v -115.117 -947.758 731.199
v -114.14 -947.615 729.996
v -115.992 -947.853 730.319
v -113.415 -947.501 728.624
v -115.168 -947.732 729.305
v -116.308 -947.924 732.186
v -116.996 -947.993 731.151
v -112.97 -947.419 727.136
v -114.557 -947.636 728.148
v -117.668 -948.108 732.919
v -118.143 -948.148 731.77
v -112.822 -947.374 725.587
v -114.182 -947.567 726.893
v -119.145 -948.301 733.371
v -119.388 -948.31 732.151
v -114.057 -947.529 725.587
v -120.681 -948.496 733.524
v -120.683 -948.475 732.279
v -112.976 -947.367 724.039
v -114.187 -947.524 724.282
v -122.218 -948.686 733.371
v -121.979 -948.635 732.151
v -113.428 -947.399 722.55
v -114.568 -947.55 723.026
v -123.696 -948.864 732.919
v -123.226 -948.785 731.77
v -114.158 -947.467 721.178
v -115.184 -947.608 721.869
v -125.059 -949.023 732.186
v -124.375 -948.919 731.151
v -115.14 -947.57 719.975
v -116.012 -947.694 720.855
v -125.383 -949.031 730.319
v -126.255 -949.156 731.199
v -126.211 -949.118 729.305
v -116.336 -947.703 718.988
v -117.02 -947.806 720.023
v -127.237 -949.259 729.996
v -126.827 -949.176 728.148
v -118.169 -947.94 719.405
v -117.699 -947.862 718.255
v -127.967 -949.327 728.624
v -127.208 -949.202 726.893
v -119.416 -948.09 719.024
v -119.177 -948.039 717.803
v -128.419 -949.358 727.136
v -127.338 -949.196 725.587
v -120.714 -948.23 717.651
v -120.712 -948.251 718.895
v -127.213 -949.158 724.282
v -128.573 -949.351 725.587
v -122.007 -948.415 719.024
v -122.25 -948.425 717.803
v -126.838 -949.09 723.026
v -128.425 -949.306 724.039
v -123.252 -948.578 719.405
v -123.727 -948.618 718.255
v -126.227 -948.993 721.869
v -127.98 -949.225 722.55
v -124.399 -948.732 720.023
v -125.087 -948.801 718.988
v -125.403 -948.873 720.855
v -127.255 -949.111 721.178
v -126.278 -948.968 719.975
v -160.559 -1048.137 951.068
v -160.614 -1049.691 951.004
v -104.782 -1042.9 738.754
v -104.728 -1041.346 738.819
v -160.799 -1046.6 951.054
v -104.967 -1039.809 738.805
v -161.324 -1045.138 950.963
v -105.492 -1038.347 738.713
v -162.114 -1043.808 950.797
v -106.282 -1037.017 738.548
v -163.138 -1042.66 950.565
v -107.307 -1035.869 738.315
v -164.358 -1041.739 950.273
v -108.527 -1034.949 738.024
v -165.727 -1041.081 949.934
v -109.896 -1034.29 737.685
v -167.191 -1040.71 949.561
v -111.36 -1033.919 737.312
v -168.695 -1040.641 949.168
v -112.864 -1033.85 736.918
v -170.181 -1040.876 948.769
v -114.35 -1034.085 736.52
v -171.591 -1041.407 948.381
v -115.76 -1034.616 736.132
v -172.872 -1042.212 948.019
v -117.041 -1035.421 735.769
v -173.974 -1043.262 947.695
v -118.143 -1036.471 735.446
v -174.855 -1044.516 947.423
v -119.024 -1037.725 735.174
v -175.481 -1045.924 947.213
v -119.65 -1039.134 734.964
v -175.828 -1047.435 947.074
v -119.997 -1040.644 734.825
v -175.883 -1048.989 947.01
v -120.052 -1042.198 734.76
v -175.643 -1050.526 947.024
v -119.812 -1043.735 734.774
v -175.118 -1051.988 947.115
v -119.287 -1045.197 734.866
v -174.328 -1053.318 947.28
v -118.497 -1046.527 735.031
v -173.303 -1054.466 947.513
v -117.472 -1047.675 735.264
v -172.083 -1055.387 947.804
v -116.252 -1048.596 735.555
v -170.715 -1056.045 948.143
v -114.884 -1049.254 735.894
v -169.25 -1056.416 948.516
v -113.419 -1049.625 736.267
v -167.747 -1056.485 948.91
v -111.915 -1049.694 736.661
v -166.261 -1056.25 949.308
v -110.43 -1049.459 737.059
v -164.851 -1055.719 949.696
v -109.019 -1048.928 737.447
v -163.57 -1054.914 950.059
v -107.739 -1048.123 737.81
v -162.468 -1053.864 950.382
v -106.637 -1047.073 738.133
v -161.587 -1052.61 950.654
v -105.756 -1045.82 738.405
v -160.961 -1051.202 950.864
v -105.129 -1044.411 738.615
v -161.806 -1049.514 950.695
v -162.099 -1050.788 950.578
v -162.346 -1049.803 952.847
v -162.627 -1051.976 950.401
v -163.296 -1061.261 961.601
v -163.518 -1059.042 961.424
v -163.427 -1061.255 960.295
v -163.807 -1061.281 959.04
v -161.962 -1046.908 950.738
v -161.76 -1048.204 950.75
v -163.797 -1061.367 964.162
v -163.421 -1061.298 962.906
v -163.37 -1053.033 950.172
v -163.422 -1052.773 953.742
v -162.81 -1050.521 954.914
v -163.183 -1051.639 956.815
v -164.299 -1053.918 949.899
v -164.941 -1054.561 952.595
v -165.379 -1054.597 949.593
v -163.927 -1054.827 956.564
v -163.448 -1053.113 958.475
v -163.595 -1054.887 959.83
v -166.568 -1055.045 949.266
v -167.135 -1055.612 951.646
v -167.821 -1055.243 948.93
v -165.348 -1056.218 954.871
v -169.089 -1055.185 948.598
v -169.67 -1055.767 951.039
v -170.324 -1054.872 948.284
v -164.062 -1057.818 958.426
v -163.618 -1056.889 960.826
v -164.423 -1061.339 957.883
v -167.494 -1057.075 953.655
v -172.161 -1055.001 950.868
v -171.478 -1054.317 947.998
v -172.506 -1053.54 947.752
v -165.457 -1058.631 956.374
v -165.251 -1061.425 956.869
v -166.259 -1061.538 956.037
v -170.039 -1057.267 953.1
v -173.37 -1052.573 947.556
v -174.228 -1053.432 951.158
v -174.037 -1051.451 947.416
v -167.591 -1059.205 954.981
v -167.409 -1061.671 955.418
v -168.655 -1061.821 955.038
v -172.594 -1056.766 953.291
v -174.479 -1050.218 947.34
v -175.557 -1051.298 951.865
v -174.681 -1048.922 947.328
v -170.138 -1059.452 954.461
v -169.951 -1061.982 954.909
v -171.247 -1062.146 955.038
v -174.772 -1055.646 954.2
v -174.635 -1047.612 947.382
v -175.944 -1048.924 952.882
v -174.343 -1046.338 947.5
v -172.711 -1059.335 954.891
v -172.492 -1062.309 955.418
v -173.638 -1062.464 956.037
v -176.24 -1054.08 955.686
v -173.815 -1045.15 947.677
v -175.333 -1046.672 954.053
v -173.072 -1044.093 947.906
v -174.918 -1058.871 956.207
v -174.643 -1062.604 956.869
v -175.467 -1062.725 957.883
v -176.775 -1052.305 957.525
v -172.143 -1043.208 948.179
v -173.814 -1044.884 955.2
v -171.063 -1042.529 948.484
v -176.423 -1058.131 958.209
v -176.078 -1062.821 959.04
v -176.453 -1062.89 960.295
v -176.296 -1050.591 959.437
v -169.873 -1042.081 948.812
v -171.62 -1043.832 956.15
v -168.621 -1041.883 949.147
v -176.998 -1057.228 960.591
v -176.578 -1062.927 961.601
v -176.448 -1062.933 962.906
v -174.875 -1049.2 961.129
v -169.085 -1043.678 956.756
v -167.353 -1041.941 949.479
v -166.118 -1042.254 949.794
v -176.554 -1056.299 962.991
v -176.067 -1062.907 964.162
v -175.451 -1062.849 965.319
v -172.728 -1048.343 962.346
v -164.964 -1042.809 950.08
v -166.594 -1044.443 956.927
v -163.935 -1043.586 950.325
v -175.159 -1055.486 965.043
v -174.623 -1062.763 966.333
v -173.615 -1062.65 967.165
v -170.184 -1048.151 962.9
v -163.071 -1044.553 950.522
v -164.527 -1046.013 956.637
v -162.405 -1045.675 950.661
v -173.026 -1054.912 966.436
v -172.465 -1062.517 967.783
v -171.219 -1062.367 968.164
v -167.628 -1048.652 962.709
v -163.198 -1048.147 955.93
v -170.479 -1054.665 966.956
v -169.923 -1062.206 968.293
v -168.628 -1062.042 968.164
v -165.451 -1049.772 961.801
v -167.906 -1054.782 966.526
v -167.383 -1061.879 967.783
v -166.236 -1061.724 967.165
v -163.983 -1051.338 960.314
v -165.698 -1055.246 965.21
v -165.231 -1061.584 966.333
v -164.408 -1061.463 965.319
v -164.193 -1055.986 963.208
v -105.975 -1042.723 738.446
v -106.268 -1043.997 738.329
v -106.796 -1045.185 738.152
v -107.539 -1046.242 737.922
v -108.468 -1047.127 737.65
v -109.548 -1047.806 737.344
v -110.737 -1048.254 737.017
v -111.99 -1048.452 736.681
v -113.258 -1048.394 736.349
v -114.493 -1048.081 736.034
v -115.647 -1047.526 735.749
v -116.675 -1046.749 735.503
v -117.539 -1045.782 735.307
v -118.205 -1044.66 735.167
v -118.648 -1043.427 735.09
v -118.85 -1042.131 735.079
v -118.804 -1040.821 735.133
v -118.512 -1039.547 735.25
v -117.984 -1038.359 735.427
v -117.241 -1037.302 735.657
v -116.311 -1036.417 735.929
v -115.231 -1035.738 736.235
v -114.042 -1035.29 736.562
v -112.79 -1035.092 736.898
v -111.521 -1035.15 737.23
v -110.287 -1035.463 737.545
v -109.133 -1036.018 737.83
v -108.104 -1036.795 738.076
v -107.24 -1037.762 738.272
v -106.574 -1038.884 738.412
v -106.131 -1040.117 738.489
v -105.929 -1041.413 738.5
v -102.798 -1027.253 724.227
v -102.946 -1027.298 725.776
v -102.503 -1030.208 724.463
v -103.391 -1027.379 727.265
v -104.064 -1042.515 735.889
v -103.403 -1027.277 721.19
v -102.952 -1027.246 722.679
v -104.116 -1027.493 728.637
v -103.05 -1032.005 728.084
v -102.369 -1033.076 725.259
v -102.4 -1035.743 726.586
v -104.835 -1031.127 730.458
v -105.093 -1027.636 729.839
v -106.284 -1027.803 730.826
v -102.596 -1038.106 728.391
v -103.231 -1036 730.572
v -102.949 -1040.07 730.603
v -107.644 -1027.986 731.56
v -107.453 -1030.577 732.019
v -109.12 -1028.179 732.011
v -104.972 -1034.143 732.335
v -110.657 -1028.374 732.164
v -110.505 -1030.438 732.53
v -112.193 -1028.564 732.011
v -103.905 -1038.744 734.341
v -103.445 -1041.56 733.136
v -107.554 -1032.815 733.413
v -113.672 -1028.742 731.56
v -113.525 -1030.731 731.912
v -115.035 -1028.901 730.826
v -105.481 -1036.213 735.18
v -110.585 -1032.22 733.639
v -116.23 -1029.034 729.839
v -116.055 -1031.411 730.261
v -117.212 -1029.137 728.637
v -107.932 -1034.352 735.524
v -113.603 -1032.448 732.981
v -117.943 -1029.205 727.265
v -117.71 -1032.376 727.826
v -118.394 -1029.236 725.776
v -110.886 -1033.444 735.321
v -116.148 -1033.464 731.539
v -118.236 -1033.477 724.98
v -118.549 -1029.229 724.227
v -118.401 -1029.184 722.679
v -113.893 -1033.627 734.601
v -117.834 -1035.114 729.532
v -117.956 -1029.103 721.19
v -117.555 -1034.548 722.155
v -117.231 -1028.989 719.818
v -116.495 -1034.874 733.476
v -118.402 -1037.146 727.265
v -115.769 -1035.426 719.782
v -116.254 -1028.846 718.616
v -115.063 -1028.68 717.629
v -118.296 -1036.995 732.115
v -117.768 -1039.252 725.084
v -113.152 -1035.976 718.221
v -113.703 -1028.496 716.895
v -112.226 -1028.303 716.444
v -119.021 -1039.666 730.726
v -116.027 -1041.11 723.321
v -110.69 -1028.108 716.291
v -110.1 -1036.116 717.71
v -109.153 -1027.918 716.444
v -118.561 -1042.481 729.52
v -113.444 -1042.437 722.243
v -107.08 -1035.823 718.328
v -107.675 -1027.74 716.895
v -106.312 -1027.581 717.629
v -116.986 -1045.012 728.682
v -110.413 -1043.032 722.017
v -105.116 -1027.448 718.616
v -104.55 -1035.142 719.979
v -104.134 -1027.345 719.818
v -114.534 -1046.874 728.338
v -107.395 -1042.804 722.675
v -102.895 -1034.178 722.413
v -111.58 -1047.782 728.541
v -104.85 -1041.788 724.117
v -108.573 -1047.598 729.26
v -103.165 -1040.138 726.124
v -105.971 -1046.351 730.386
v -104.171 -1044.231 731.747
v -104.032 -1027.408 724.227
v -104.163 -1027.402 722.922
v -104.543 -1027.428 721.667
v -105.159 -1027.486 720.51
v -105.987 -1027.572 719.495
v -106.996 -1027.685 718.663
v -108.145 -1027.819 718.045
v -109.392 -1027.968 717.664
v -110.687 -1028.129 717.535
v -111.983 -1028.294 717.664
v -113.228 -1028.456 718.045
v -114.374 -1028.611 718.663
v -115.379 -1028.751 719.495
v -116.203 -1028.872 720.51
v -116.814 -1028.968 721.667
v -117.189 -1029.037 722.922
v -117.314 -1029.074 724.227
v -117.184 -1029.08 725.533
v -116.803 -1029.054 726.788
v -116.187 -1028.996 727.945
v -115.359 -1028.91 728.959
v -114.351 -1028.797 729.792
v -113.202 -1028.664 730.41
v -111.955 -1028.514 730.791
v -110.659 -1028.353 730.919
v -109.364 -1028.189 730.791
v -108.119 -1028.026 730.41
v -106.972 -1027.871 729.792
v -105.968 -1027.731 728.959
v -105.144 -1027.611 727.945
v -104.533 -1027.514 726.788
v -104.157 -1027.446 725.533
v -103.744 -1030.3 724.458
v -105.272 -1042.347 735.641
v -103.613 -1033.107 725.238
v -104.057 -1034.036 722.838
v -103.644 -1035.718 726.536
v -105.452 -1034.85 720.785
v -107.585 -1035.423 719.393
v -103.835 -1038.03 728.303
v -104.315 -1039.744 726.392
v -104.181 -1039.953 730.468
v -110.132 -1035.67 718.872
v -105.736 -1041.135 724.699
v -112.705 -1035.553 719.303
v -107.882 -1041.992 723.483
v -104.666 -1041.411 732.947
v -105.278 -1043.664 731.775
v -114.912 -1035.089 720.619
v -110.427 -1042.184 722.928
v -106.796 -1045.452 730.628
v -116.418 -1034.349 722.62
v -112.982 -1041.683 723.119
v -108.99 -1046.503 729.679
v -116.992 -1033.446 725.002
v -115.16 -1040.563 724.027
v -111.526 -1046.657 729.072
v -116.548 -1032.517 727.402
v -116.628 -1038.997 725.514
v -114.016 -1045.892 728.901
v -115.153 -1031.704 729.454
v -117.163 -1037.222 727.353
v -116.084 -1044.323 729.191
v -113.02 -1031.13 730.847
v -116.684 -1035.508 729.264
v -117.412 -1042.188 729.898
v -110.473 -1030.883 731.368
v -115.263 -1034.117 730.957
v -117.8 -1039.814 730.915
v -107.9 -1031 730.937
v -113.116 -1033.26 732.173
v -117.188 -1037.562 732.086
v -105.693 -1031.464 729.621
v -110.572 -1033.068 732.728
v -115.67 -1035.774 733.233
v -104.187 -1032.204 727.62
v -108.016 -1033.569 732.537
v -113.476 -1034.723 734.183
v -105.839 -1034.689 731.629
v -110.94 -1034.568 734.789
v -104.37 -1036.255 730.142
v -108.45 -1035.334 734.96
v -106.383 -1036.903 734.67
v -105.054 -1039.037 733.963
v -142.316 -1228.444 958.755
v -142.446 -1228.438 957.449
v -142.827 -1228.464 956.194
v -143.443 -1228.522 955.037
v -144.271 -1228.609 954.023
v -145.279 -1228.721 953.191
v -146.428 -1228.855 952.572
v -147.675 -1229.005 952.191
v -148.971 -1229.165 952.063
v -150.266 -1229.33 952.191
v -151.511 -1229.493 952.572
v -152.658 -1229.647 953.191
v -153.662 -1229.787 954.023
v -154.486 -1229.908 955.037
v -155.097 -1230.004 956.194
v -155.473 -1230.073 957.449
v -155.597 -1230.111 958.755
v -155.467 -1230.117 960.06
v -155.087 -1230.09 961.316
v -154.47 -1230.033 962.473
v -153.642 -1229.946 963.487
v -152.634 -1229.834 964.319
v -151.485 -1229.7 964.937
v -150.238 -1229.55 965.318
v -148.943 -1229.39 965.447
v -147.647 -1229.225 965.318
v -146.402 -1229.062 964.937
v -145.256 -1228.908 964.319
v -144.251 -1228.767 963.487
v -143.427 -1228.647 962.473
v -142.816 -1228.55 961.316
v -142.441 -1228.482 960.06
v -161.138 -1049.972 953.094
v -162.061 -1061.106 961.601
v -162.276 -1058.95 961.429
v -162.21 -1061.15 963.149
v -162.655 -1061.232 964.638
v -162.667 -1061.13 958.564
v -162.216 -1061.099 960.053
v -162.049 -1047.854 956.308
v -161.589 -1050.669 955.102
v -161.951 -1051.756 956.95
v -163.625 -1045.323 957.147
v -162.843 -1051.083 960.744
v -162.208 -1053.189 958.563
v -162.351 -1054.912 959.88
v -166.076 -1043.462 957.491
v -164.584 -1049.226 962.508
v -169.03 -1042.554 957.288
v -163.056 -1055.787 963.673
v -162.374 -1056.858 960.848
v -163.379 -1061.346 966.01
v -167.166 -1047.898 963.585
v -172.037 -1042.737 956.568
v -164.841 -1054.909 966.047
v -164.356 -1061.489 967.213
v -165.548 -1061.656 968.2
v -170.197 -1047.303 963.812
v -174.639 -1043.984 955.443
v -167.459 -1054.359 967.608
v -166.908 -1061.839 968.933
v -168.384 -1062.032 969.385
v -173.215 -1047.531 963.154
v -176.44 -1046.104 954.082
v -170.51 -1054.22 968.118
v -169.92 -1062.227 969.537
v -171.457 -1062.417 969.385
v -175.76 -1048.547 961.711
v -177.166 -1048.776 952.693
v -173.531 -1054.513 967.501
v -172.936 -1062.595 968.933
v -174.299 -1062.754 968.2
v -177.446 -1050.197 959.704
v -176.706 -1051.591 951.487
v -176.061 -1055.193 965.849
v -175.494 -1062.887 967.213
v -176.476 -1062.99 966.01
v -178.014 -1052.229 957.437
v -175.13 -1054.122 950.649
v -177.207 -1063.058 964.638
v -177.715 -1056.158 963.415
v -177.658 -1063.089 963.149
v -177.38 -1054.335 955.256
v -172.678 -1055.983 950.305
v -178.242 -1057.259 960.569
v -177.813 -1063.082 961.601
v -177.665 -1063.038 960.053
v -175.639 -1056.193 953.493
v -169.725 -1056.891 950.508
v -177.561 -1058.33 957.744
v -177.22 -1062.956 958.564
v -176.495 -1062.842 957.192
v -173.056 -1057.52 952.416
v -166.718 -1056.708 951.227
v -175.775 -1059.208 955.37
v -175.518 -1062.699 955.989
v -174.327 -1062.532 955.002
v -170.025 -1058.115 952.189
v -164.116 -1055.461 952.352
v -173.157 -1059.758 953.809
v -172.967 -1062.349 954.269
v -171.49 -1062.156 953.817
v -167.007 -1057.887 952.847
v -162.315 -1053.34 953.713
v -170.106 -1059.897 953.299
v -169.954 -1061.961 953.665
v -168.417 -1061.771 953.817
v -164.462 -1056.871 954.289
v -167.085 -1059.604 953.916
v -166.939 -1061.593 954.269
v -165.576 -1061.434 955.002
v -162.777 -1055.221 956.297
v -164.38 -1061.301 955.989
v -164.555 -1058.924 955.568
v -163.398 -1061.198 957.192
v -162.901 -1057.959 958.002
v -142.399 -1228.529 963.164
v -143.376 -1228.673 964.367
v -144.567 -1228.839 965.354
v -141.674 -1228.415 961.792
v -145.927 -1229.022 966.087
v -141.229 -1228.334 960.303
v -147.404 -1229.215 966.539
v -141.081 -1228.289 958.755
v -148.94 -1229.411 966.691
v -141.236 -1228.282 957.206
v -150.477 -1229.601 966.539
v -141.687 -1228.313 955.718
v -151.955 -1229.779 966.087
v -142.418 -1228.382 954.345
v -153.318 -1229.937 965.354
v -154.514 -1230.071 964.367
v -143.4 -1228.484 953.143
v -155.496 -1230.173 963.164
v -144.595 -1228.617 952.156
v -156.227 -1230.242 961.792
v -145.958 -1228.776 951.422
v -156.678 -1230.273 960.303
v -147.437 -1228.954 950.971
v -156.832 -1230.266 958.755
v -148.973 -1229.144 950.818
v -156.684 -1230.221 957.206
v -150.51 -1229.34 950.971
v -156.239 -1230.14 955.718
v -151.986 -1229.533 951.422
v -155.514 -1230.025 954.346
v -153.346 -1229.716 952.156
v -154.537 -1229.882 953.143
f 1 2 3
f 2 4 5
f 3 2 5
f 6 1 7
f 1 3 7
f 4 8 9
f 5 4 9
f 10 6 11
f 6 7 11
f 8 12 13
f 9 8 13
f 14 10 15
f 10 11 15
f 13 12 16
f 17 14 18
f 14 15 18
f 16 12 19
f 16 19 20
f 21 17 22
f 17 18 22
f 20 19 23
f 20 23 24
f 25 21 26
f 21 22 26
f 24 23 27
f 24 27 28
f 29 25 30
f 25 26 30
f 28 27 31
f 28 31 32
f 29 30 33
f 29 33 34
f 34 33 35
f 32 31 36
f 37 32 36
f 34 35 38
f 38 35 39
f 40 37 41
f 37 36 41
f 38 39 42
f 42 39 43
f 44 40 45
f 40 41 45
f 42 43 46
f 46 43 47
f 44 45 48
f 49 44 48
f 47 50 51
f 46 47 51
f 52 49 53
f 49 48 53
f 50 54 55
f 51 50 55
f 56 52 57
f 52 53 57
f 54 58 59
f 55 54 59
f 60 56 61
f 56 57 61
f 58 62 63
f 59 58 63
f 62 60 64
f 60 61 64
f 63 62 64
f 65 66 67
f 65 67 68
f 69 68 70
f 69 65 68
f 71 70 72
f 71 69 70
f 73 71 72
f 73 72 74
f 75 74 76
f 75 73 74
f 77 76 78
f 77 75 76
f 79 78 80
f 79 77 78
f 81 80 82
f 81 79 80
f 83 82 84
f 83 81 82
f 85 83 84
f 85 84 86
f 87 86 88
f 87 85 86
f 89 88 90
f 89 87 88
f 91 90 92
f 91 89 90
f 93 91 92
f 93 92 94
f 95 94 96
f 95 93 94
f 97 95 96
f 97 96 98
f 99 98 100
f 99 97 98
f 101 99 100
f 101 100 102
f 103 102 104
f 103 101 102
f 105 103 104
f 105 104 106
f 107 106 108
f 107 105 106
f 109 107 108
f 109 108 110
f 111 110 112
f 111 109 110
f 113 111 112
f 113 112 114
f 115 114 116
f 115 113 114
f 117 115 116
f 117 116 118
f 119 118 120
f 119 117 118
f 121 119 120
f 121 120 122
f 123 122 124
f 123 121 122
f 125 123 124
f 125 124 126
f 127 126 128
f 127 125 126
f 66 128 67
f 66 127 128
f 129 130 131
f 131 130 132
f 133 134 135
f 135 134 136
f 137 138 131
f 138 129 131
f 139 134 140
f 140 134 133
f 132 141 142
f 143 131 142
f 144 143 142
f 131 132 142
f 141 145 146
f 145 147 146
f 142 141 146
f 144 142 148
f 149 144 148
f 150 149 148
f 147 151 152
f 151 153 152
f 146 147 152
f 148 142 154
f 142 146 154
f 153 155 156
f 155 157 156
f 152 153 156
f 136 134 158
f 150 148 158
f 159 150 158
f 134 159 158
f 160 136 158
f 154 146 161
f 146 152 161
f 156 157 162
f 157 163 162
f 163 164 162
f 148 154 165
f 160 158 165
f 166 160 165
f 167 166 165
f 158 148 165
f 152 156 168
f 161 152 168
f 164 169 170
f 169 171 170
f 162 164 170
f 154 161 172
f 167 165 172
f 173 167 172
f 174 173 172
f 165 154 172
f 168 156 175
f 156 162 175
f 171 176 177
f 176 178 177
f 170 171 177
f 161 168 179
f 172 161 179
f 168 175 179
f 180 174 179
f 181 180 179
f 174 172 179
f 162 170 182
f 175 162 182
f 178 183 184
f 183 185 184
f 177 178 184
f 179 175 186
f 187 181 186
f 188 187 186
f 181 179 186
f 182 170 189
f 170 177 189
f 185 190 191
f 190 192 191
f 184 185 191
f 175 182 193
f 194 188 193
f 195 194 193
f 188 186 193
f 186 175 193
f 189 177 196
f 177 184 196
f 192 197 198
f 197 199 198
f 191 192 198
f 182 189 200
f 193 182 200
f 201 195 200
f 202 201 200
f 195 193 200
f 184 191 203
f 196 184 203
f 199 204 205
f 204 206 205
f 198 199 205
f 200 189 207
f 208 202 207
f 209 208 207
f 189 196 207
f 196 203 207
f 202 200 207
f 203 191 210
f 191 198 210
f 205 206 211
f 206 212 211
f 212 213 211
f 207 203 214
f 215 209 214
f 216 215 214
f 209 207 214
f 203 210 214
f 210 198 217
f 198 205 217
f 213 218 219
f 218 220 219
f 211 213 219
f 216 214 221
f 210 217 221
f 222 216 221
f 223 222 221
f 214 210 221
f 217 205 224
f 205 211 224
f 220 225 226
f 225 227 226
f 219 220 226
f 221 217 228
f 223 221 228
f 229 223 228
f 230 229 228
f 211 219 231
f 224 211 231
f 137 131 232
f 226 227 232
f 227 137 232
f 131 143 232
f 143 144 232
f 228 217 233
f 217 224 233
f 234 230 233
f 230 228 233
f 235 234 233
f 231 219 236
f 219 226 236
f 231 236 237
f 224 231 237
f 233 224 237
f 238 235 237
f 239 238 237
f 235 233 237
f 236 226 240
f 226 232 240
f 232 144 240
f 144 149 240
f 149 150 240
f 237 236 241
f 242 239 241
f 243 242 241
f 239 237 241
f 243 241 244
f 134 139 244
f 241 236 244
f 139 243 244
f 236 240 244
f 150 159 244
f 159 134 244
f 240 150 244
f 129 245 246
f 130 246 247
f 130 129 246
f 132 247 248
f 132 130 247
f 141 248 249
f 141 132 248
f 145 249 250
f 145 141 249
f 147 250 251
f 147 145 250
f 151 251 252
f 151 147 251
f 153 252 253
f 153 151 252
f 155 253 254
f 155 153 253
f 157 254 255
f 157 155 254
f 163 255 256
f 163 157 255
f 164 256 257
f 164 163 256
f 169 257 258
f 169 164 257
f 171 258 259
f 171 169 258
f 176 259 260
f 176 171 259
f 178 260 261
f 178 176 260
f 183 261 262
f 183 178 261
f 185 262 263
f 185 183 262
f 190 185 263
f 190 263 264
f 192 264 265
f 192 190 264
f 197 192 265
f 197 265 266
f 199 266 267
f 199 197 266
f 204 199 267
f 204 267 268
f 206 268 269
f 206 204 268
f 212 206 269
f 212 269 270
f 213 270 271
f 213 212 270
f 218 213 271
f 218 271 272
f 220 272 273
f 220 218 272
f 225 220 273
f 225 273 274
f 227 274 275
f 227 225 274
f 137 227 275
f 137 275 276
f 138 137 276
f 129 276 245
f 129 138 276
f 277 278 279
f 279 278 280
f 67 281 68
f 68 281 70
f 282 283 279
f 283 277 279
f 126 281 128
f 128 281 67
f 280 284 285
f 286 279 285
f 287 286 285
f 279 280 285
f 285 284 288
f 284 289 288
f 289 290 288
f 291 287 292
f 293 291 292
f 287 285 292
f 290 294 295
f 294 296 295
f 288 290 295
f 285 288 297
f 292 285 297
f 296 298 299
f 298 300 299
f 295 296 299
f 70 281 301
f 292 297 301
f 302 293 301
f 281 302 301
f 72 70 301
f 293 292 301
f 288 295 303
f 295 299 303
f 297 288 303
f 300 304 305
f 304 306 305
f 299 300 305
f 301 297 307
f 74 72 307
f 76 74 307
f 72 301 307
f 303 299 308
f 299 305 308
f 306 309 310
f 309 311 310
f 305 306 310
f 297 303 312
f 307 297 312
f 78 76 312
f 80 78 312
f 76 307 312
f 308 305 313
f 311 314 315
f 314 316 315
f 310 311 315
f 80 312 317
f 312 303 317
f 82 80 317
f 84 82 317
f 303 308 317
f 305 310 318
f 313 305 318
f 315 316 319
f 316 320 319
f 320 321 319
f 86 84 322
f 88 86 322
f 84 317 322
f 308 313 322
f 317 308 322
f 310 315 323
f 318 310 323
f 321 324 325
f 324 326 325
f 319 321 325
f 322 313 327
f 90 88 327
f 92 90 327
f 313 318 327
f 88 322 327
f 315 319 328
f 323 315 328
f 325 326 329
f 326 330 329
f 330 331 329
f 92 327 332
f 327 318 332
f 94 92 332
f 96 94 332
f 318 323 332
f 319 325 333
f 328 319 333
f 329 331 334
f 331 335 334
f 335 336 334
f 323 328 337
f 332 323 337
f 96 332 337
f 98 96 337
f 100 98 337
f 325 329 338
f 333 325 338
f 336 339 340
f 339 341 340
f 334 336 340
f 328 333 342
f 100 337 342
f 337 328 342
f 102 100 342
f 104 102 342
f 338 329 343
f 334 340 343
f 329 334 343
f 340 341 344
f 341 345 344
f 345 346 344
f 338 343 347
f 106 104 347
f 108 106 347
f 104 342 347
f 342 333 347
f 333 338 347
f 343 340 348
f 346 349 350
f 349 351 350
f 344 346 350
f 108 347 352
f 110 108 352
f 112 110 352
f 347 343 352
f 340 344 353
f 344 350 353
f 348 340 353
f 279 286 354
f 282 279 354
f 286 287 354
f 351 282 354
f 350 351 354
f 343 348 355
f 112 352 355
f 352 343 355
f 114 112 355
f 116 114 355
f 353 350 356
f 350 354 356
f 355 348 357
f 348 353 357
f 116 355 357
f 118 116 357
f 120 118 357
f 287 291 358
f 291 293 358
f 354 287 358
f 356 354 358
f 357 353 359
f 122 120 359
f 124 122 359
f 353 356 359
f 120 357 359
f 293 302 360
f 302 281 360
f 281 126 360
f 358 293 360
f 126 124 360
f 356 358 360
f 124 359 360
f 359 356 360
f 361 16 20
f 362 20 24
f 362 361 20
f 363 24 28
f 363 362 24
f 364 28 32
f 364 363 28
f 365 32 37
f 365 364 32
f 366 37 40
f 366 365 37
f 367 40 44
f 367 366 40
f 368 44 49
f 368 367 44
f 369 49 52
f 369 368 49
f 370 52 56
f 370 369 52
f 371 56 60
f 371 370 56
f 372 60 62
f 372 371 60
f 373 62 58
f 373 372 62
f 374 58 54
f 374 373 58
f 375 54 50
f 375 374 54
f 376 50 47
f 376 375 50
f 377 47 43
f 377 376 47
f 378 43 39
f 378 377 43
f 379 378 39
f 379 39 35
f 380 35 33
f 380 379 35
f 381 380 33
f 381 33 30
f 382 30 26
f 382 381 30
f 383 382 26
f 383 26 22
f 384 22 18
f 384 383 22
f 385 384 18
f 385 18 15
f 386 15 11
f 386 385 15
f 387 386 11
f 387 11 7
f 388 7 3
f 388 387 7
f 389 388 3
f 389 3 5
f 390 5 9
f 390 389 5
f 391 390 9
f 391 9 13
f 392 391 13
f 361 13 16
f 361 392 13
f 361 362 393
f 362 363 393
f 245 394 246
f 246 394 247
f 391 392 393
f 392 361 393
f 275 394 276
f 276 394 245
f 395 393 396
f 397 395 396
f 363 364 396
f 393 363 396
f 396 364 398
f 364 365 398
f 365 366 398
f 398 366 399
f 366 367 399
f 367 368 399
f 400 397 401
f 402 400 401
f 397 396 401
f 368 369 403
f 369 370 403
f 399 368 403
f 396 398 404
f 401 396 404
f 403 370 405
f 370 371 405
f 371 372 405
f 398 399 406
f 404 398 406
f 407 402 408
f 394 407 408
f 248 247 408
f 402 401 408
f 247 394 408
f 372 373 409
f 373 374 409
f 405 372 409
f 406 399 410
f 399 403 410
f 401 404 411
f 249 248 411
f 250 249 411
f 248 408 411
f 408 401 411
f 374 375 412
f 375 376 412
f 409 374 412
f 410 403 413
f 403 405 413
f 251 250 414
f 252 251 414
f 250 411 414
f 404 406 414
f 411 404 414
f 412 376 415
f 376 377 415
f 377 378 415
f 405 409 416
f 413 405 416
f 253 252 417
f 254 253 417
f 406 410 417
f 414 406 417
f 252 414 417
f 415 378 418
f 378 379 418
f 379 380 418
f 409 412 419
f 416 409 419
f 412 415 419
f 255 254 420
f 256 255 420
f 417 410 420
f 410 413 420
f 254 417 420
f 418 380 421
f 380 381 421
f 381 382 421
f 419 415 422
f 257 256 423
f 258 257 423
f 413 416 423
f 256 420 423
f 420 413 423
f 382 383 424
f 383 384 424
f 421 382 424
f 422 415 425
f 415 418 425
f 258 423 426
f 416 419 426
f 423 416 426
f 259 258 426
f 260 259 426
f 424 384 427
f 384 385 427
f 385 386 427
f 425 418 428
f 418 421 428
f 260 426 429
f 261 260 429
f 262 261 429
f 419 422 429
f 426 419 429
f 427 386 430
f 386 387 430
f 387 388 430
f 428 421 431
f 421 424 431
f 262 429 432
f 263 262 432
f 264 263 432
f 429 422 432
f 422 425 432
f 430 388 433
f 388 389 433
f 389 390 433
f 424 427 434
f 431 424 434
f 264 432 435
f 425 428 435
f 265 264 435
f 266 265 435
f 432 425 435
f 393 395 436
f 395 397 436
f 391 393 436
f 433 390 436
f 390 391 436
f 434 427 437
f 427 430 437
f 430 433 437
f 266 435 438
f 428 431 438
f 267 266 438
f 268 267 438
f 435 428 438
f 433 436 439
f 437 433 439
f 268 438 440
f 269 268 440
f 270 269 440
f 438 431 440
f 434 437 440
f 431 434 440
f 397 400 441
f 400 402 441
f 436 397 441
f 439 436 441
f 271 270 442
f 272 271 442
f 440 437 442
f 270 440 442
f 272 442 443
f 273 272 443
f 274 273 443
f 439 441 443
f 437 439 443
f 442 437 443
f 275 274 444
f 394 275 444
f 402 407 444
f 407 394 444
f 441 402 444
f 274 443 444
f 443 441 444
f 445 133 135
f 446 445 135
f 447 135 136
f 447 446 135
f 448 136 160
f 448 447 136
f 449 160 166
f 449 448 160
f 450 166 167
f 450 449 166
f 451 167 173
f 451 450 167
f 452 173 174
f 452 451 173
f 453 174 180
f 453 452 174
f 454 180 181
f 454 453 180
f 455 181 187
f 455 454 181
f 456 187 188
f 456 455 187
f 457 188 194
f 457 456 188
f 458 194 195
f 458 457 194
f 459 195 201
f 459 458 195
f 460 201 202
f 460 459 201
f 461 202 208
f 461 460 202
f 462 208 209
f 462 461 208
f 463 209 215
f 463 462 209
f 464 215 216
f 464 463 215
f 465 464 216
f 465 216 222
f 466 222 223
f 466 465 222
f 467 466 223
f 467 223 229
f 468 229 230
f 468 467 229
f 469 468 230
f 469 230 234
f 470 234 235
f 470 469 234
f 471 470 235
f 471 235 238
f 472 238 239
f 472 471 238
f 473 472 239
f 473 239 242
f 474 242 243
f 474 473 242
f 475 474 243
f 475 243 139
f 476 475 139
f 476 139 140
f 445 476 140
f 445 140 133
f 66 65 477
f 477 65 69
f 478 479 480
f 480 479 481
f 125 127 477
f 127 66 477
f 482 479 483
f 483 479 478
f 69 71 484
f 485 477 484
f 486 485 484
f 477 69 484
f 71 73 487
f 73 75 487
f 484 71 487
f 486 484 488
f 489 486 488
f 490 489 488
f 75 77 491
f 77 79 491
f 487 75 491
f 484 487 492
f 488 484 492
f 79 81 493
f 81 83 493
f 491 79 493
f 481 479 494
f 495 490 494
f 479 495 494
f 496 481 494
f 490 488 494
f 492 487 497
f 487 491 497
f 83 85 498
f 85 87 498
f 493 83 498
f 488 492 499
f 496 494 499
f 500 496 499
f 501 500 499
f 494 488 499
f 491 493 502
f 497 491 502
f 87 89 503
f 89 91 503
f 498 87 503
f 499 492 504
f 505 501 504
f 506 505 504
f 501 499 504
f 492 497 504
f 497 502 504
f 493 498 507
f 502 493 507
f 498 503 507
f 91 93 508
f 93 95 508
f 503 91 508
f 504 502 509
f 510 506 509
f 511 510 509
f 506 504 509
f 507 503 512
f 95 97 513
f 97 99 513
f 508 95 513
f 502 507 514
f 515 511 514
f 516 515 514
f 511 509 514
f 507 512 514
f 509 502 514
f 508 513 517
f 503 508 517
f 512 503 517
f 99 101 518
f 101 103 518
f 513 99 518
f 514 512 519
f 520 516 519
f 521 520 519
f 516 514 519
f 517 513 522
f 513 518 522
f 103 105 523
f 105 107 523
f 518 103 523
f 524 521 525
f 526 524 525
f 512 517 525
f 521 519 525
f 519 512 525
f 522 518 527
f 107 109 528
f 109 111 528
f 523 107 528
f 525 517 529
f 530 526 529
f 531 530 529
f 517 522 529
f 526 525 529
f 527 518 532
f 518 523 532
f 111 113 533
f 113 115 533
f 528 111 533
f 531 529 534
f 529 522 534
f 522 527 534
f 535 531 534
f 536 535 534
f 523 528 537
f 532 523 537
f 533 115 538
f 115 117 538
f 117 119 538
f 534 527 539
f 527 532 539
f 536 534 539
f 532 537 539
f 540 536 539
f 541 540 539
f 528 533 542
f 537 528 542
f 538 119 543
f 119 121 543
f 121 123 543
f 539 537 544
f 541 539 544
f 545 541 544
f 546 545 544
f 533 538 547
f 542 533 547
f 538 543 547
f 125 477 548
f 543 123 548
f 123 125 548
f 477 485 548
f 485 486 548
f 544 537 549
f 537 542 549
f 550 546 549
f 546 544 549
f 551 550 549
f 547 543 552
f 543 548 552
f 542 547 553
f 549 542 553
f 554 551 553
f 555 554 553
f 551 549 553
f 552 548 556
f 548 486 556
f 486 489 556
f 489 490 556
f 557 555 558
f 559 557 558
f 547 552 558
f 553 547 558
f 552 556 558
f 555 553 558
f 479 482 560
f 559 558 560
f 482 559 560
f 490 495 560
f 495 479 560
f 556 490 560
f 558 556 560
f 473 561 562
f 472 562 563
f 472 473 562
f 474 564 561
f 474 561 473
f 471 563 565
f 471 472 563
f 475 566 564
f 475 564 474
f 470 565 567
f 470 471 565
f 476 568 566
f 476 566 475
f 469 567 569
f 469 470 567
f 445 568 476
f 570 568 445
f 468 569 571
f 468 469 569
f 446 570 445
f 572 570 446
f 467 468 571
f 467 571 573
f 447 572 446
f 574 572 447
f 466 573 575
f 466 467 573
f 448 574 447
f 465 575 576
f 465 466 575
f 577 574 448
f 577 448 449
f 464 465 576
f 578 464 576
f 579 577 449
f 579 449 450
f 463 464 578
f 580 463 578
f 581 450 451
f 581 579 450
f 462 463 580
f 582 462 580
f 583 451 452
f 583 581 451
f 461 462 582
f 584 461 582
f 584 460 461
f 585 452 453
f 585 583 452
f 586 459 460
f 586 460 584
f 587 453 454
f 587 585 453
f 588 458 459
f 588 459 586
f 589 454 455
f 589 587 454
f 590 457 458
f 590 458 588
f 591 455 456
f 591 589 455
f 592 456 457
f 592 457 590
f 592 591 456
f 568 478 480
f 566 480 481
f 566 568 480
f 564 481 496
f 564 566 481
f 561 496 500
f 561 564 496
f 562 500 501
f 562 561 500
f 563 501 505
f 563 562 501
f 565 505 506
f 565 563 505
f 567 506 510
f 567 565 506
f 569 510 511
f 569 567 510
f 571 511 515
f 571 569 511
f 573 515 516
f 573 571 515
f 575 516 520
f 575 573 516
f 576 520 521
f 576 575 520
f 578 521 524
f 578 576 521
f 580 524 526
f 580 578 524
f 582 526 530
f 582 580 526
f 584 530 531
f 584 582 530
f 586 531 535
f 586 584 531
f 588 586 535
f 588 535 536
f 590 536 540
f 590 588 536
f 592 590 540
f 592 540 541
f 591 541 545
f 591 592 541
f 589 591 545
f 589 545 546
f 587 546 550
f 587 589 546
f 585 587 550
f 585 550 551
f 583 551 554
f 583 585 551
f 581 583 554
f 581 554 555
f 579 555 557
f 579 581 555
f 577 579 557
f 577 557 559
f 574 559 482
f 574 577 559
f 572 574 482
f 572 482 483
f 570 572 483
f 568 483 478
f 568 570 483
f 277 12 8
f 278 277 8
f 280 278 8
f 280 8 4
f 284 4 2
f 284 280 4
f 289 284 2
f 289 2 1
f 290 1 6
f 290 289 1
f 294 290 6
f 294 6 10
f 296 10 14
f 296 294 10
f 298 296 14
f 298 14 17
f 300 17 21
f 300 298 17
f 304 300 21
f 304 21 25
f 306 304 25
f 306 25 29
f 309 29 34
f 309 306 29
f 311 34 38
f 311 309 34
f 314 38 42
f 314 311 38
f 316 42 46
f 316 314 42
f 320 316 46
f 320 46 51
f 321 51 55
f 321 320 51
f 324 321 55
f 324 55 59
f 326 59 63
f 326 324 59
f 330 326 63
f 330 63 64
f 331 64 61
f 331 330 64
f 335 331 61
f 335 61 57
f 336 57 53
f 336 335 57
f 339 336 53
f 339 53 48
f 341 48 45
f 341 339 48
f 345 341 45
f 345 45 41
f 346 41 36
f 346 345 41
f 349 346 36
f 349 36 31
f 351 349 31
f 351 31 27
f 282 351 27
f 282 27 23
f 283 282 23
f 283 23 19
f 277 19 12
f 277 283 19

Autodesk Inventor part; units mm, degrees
ref_plane "YZ Plane" through (0, 0, 0) normal (1, 0, 0) x (0, 1, 0)
ref_plane "XZ Plane" through (0, 0, 0) normal (0, 1, 0) x (-1, 0, 0)
ref_plane "Work Plane5" through (-120.6975, -948.3628, 725.5872) normal (0.1245, -0.9921, -0.0169) x (0.9922, 0.1245, 0)
sketch "Sketch7" plane through (-120.6975, -948.3628, 725.5872) normal (0.1245, -0.9921, -0.0169) x (0.9922, 0.1245, 0)
  circle A0 centre (0, 0) radius 7.9375
  circle A1 centre (0, 0) radius 6.6929
sketch3d "3D Sketch5"
  line L0 (-120.6975, -948.3628, 725.5872) -> (-110.6733, -1028.2411, 724.2274)
  arc A0 (-110.6733, -1028.2411, 724.2274) -> (-112.3897, -1041.7721, 736.7895) centre (-113.9512, -1028.8663, 736.7917) ccw
  line L1 (-112.3897, -1041.7721, 736.7895) -> (-168.2208, -1048.563, 949.0387)
  arc A1 (-168.2208, -1048.563, 949.0387) -> (-169.9372, -1062.094, 961.6009) centre (-166.6592, -1061.4688, 949.0366) ccw
  line L2 (-169.9372, -1062.094, 961.6009) -> (-148.9567, -1229.2774, 958.7547)
  dimension "d20" = 12.9999
  dimension "d21" = 12.9999
sweep "Sweep5" add profiles "Sketch7" path "3D Sketch5"
equation "\"OD\" = 15.875"
equation "\"t\" = 1.2446"
equation "\"L\" = PL"
equation "\"ID\" = 13.3858"
equation "\"PL\" = 509.905"
equation "\"Size_Designation\" = 1.2345"
properties material "Copper"
